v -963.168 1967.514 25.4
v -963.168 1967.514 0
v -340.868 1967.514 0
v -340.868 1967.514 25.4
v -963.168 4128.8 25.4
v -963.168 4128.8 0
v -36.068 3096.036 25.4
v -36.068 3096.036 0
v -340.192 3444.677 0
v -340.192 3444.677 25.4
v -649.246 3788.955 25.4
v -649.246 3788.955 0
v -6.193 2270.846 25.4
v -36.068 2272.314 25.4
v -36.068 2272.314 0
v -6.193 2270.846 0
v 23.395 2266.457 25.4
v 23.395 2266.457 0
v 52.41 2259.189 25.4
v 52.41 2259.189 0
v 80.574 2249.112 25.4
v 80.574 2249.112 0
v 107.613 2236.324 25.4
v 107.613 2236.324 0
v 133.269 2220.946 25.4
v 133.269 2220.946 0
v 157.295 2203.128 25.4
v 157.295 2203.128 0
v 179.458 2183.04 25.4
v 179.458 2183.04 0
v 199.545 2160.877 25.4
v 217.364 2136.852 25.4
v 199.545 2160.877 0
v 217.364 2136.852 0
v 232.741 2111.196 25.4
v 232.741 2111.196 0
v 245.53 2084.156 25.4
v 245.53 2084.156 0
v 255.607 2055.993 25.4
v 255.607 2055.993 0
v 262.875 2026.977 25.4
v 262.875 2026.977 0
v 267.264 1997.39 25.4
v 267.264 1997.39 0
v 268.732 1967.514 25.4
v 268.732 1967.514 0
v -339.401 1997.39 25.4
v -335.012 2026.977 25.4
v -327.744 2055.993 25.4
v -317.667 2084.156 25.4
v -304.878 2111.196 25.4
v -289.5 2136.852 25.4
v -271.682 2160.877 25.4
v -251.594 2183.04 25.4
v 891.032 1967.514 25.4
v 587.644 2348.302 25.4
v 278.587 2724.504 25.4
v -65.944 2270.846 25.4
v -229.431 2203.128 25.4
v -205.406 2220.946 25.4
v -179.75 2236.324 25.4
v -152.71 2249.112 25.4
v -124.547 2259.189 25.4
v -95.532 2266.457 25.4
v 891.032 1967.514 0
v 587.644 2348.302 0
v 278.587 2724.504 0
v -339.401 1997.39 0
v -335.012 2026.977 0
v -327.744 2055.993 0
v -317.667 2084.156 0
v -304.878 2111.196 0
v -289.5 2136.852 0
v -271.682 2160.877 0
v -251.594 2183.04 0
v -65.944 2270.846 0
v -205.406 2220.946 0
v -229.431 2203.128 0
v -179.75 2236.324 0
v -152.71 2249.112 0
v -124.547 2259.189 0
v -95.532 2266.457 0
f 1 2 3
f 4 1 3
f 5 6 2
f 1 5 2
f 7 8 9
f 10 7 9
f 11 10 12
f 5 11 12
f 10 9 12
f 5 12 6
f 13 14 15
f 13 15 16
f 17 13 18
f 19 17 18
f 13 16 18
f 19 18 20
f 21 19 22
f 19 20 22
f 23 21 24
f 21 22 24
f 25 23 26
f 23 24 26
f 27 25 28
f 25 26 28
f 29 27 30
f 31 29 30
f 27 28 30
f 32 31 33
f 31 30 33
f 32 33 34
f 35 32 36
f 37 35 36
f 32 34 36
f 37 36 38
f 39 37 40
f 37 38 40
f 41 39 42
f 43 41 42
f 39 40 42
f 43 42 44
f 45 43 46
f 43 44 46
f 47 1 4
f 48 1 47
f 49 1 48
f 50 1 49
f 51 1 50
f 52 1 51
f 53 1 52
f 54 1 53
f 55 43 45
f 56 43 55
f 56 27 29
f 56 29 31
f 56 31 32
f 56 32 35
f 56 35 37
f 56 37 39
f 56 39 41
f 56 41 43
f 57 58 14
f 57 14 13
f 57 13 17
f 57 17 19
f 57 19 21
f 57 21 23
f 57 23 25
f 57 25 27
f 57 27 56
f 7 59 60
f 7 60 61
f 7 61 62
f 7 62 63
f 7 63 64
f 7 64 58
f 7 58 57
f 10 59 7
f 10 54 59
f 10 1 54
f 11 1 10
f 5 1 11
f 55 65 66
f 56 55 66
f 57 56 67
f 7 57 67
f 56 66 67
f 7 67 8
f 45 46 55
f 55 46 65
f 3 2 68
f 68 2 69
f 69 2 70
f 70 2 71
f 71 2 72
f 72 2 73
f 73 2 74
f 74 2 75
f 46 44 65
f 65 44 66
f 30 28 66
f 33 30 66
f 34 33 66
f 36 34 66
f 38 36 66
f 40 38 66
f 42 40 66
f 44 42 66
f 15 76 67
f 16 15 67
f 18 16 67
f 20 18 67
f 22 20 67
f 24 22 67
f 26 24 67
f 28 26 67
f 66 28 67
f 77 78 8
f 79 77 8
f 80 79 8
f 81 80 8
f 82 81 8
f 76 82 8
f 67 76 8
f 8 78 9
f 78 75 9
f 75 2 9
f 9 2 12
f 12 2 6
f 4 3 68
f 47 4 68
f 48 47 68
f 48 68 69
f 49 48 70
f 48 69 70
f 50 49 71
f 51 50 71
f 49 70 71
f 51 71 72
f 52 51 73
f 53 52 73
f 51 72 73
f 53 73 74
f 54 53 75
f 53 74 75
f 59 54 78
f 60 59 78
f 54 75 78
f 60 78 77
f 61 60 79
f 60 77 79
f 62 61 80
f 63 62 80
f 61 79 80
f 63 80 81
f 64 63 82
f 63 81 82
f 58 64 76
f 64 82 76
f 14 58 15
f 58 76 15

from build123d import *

# Parameters (mm, degrees)
F1_DEPTH = 25.4


with BuildPart() as f1:
    # F0 (on Top) → F1 (new body)
    with BuildSketch(Plane.XY):
        with BuildLine():
            Line((-963.168343, 4128.799945), (-963.168343, 1967.513945))
            Line((-963.168343, 1967.513945), (-340.868343, 1967.513945))
            ThreePointArc((-340.868343, 1967.513945), (-251.59449, 2183.040092), (-36.068343, 2272.313945))
            Line((-36.068343, 2272.313945), (-36.068343, 3096.035945))
            ThreePointArc((-36.068343, 3096.035945), (-494.106465, 3617.365893), (-963.168343, 4128.799945))
        make_face()
        with BuildLine():
            Line((-36.068343, 3096.035945), (-36.068343, 2272.313945))
            ThreePointArc((-36.068343, 2272.313945), (179.457803, 2183.040092), (268.731657, 1967.513945))
            Line((268.731657, 1967.513945), (891.031657, 1967.513945))
            ThreePointArc((891.031657, 1967.513945), (433.820002, 2536.982003), (-36.068343, 3096.035945))
        make_face()
    extrude(amount=F1_DEPTH)


solid = f1.part
